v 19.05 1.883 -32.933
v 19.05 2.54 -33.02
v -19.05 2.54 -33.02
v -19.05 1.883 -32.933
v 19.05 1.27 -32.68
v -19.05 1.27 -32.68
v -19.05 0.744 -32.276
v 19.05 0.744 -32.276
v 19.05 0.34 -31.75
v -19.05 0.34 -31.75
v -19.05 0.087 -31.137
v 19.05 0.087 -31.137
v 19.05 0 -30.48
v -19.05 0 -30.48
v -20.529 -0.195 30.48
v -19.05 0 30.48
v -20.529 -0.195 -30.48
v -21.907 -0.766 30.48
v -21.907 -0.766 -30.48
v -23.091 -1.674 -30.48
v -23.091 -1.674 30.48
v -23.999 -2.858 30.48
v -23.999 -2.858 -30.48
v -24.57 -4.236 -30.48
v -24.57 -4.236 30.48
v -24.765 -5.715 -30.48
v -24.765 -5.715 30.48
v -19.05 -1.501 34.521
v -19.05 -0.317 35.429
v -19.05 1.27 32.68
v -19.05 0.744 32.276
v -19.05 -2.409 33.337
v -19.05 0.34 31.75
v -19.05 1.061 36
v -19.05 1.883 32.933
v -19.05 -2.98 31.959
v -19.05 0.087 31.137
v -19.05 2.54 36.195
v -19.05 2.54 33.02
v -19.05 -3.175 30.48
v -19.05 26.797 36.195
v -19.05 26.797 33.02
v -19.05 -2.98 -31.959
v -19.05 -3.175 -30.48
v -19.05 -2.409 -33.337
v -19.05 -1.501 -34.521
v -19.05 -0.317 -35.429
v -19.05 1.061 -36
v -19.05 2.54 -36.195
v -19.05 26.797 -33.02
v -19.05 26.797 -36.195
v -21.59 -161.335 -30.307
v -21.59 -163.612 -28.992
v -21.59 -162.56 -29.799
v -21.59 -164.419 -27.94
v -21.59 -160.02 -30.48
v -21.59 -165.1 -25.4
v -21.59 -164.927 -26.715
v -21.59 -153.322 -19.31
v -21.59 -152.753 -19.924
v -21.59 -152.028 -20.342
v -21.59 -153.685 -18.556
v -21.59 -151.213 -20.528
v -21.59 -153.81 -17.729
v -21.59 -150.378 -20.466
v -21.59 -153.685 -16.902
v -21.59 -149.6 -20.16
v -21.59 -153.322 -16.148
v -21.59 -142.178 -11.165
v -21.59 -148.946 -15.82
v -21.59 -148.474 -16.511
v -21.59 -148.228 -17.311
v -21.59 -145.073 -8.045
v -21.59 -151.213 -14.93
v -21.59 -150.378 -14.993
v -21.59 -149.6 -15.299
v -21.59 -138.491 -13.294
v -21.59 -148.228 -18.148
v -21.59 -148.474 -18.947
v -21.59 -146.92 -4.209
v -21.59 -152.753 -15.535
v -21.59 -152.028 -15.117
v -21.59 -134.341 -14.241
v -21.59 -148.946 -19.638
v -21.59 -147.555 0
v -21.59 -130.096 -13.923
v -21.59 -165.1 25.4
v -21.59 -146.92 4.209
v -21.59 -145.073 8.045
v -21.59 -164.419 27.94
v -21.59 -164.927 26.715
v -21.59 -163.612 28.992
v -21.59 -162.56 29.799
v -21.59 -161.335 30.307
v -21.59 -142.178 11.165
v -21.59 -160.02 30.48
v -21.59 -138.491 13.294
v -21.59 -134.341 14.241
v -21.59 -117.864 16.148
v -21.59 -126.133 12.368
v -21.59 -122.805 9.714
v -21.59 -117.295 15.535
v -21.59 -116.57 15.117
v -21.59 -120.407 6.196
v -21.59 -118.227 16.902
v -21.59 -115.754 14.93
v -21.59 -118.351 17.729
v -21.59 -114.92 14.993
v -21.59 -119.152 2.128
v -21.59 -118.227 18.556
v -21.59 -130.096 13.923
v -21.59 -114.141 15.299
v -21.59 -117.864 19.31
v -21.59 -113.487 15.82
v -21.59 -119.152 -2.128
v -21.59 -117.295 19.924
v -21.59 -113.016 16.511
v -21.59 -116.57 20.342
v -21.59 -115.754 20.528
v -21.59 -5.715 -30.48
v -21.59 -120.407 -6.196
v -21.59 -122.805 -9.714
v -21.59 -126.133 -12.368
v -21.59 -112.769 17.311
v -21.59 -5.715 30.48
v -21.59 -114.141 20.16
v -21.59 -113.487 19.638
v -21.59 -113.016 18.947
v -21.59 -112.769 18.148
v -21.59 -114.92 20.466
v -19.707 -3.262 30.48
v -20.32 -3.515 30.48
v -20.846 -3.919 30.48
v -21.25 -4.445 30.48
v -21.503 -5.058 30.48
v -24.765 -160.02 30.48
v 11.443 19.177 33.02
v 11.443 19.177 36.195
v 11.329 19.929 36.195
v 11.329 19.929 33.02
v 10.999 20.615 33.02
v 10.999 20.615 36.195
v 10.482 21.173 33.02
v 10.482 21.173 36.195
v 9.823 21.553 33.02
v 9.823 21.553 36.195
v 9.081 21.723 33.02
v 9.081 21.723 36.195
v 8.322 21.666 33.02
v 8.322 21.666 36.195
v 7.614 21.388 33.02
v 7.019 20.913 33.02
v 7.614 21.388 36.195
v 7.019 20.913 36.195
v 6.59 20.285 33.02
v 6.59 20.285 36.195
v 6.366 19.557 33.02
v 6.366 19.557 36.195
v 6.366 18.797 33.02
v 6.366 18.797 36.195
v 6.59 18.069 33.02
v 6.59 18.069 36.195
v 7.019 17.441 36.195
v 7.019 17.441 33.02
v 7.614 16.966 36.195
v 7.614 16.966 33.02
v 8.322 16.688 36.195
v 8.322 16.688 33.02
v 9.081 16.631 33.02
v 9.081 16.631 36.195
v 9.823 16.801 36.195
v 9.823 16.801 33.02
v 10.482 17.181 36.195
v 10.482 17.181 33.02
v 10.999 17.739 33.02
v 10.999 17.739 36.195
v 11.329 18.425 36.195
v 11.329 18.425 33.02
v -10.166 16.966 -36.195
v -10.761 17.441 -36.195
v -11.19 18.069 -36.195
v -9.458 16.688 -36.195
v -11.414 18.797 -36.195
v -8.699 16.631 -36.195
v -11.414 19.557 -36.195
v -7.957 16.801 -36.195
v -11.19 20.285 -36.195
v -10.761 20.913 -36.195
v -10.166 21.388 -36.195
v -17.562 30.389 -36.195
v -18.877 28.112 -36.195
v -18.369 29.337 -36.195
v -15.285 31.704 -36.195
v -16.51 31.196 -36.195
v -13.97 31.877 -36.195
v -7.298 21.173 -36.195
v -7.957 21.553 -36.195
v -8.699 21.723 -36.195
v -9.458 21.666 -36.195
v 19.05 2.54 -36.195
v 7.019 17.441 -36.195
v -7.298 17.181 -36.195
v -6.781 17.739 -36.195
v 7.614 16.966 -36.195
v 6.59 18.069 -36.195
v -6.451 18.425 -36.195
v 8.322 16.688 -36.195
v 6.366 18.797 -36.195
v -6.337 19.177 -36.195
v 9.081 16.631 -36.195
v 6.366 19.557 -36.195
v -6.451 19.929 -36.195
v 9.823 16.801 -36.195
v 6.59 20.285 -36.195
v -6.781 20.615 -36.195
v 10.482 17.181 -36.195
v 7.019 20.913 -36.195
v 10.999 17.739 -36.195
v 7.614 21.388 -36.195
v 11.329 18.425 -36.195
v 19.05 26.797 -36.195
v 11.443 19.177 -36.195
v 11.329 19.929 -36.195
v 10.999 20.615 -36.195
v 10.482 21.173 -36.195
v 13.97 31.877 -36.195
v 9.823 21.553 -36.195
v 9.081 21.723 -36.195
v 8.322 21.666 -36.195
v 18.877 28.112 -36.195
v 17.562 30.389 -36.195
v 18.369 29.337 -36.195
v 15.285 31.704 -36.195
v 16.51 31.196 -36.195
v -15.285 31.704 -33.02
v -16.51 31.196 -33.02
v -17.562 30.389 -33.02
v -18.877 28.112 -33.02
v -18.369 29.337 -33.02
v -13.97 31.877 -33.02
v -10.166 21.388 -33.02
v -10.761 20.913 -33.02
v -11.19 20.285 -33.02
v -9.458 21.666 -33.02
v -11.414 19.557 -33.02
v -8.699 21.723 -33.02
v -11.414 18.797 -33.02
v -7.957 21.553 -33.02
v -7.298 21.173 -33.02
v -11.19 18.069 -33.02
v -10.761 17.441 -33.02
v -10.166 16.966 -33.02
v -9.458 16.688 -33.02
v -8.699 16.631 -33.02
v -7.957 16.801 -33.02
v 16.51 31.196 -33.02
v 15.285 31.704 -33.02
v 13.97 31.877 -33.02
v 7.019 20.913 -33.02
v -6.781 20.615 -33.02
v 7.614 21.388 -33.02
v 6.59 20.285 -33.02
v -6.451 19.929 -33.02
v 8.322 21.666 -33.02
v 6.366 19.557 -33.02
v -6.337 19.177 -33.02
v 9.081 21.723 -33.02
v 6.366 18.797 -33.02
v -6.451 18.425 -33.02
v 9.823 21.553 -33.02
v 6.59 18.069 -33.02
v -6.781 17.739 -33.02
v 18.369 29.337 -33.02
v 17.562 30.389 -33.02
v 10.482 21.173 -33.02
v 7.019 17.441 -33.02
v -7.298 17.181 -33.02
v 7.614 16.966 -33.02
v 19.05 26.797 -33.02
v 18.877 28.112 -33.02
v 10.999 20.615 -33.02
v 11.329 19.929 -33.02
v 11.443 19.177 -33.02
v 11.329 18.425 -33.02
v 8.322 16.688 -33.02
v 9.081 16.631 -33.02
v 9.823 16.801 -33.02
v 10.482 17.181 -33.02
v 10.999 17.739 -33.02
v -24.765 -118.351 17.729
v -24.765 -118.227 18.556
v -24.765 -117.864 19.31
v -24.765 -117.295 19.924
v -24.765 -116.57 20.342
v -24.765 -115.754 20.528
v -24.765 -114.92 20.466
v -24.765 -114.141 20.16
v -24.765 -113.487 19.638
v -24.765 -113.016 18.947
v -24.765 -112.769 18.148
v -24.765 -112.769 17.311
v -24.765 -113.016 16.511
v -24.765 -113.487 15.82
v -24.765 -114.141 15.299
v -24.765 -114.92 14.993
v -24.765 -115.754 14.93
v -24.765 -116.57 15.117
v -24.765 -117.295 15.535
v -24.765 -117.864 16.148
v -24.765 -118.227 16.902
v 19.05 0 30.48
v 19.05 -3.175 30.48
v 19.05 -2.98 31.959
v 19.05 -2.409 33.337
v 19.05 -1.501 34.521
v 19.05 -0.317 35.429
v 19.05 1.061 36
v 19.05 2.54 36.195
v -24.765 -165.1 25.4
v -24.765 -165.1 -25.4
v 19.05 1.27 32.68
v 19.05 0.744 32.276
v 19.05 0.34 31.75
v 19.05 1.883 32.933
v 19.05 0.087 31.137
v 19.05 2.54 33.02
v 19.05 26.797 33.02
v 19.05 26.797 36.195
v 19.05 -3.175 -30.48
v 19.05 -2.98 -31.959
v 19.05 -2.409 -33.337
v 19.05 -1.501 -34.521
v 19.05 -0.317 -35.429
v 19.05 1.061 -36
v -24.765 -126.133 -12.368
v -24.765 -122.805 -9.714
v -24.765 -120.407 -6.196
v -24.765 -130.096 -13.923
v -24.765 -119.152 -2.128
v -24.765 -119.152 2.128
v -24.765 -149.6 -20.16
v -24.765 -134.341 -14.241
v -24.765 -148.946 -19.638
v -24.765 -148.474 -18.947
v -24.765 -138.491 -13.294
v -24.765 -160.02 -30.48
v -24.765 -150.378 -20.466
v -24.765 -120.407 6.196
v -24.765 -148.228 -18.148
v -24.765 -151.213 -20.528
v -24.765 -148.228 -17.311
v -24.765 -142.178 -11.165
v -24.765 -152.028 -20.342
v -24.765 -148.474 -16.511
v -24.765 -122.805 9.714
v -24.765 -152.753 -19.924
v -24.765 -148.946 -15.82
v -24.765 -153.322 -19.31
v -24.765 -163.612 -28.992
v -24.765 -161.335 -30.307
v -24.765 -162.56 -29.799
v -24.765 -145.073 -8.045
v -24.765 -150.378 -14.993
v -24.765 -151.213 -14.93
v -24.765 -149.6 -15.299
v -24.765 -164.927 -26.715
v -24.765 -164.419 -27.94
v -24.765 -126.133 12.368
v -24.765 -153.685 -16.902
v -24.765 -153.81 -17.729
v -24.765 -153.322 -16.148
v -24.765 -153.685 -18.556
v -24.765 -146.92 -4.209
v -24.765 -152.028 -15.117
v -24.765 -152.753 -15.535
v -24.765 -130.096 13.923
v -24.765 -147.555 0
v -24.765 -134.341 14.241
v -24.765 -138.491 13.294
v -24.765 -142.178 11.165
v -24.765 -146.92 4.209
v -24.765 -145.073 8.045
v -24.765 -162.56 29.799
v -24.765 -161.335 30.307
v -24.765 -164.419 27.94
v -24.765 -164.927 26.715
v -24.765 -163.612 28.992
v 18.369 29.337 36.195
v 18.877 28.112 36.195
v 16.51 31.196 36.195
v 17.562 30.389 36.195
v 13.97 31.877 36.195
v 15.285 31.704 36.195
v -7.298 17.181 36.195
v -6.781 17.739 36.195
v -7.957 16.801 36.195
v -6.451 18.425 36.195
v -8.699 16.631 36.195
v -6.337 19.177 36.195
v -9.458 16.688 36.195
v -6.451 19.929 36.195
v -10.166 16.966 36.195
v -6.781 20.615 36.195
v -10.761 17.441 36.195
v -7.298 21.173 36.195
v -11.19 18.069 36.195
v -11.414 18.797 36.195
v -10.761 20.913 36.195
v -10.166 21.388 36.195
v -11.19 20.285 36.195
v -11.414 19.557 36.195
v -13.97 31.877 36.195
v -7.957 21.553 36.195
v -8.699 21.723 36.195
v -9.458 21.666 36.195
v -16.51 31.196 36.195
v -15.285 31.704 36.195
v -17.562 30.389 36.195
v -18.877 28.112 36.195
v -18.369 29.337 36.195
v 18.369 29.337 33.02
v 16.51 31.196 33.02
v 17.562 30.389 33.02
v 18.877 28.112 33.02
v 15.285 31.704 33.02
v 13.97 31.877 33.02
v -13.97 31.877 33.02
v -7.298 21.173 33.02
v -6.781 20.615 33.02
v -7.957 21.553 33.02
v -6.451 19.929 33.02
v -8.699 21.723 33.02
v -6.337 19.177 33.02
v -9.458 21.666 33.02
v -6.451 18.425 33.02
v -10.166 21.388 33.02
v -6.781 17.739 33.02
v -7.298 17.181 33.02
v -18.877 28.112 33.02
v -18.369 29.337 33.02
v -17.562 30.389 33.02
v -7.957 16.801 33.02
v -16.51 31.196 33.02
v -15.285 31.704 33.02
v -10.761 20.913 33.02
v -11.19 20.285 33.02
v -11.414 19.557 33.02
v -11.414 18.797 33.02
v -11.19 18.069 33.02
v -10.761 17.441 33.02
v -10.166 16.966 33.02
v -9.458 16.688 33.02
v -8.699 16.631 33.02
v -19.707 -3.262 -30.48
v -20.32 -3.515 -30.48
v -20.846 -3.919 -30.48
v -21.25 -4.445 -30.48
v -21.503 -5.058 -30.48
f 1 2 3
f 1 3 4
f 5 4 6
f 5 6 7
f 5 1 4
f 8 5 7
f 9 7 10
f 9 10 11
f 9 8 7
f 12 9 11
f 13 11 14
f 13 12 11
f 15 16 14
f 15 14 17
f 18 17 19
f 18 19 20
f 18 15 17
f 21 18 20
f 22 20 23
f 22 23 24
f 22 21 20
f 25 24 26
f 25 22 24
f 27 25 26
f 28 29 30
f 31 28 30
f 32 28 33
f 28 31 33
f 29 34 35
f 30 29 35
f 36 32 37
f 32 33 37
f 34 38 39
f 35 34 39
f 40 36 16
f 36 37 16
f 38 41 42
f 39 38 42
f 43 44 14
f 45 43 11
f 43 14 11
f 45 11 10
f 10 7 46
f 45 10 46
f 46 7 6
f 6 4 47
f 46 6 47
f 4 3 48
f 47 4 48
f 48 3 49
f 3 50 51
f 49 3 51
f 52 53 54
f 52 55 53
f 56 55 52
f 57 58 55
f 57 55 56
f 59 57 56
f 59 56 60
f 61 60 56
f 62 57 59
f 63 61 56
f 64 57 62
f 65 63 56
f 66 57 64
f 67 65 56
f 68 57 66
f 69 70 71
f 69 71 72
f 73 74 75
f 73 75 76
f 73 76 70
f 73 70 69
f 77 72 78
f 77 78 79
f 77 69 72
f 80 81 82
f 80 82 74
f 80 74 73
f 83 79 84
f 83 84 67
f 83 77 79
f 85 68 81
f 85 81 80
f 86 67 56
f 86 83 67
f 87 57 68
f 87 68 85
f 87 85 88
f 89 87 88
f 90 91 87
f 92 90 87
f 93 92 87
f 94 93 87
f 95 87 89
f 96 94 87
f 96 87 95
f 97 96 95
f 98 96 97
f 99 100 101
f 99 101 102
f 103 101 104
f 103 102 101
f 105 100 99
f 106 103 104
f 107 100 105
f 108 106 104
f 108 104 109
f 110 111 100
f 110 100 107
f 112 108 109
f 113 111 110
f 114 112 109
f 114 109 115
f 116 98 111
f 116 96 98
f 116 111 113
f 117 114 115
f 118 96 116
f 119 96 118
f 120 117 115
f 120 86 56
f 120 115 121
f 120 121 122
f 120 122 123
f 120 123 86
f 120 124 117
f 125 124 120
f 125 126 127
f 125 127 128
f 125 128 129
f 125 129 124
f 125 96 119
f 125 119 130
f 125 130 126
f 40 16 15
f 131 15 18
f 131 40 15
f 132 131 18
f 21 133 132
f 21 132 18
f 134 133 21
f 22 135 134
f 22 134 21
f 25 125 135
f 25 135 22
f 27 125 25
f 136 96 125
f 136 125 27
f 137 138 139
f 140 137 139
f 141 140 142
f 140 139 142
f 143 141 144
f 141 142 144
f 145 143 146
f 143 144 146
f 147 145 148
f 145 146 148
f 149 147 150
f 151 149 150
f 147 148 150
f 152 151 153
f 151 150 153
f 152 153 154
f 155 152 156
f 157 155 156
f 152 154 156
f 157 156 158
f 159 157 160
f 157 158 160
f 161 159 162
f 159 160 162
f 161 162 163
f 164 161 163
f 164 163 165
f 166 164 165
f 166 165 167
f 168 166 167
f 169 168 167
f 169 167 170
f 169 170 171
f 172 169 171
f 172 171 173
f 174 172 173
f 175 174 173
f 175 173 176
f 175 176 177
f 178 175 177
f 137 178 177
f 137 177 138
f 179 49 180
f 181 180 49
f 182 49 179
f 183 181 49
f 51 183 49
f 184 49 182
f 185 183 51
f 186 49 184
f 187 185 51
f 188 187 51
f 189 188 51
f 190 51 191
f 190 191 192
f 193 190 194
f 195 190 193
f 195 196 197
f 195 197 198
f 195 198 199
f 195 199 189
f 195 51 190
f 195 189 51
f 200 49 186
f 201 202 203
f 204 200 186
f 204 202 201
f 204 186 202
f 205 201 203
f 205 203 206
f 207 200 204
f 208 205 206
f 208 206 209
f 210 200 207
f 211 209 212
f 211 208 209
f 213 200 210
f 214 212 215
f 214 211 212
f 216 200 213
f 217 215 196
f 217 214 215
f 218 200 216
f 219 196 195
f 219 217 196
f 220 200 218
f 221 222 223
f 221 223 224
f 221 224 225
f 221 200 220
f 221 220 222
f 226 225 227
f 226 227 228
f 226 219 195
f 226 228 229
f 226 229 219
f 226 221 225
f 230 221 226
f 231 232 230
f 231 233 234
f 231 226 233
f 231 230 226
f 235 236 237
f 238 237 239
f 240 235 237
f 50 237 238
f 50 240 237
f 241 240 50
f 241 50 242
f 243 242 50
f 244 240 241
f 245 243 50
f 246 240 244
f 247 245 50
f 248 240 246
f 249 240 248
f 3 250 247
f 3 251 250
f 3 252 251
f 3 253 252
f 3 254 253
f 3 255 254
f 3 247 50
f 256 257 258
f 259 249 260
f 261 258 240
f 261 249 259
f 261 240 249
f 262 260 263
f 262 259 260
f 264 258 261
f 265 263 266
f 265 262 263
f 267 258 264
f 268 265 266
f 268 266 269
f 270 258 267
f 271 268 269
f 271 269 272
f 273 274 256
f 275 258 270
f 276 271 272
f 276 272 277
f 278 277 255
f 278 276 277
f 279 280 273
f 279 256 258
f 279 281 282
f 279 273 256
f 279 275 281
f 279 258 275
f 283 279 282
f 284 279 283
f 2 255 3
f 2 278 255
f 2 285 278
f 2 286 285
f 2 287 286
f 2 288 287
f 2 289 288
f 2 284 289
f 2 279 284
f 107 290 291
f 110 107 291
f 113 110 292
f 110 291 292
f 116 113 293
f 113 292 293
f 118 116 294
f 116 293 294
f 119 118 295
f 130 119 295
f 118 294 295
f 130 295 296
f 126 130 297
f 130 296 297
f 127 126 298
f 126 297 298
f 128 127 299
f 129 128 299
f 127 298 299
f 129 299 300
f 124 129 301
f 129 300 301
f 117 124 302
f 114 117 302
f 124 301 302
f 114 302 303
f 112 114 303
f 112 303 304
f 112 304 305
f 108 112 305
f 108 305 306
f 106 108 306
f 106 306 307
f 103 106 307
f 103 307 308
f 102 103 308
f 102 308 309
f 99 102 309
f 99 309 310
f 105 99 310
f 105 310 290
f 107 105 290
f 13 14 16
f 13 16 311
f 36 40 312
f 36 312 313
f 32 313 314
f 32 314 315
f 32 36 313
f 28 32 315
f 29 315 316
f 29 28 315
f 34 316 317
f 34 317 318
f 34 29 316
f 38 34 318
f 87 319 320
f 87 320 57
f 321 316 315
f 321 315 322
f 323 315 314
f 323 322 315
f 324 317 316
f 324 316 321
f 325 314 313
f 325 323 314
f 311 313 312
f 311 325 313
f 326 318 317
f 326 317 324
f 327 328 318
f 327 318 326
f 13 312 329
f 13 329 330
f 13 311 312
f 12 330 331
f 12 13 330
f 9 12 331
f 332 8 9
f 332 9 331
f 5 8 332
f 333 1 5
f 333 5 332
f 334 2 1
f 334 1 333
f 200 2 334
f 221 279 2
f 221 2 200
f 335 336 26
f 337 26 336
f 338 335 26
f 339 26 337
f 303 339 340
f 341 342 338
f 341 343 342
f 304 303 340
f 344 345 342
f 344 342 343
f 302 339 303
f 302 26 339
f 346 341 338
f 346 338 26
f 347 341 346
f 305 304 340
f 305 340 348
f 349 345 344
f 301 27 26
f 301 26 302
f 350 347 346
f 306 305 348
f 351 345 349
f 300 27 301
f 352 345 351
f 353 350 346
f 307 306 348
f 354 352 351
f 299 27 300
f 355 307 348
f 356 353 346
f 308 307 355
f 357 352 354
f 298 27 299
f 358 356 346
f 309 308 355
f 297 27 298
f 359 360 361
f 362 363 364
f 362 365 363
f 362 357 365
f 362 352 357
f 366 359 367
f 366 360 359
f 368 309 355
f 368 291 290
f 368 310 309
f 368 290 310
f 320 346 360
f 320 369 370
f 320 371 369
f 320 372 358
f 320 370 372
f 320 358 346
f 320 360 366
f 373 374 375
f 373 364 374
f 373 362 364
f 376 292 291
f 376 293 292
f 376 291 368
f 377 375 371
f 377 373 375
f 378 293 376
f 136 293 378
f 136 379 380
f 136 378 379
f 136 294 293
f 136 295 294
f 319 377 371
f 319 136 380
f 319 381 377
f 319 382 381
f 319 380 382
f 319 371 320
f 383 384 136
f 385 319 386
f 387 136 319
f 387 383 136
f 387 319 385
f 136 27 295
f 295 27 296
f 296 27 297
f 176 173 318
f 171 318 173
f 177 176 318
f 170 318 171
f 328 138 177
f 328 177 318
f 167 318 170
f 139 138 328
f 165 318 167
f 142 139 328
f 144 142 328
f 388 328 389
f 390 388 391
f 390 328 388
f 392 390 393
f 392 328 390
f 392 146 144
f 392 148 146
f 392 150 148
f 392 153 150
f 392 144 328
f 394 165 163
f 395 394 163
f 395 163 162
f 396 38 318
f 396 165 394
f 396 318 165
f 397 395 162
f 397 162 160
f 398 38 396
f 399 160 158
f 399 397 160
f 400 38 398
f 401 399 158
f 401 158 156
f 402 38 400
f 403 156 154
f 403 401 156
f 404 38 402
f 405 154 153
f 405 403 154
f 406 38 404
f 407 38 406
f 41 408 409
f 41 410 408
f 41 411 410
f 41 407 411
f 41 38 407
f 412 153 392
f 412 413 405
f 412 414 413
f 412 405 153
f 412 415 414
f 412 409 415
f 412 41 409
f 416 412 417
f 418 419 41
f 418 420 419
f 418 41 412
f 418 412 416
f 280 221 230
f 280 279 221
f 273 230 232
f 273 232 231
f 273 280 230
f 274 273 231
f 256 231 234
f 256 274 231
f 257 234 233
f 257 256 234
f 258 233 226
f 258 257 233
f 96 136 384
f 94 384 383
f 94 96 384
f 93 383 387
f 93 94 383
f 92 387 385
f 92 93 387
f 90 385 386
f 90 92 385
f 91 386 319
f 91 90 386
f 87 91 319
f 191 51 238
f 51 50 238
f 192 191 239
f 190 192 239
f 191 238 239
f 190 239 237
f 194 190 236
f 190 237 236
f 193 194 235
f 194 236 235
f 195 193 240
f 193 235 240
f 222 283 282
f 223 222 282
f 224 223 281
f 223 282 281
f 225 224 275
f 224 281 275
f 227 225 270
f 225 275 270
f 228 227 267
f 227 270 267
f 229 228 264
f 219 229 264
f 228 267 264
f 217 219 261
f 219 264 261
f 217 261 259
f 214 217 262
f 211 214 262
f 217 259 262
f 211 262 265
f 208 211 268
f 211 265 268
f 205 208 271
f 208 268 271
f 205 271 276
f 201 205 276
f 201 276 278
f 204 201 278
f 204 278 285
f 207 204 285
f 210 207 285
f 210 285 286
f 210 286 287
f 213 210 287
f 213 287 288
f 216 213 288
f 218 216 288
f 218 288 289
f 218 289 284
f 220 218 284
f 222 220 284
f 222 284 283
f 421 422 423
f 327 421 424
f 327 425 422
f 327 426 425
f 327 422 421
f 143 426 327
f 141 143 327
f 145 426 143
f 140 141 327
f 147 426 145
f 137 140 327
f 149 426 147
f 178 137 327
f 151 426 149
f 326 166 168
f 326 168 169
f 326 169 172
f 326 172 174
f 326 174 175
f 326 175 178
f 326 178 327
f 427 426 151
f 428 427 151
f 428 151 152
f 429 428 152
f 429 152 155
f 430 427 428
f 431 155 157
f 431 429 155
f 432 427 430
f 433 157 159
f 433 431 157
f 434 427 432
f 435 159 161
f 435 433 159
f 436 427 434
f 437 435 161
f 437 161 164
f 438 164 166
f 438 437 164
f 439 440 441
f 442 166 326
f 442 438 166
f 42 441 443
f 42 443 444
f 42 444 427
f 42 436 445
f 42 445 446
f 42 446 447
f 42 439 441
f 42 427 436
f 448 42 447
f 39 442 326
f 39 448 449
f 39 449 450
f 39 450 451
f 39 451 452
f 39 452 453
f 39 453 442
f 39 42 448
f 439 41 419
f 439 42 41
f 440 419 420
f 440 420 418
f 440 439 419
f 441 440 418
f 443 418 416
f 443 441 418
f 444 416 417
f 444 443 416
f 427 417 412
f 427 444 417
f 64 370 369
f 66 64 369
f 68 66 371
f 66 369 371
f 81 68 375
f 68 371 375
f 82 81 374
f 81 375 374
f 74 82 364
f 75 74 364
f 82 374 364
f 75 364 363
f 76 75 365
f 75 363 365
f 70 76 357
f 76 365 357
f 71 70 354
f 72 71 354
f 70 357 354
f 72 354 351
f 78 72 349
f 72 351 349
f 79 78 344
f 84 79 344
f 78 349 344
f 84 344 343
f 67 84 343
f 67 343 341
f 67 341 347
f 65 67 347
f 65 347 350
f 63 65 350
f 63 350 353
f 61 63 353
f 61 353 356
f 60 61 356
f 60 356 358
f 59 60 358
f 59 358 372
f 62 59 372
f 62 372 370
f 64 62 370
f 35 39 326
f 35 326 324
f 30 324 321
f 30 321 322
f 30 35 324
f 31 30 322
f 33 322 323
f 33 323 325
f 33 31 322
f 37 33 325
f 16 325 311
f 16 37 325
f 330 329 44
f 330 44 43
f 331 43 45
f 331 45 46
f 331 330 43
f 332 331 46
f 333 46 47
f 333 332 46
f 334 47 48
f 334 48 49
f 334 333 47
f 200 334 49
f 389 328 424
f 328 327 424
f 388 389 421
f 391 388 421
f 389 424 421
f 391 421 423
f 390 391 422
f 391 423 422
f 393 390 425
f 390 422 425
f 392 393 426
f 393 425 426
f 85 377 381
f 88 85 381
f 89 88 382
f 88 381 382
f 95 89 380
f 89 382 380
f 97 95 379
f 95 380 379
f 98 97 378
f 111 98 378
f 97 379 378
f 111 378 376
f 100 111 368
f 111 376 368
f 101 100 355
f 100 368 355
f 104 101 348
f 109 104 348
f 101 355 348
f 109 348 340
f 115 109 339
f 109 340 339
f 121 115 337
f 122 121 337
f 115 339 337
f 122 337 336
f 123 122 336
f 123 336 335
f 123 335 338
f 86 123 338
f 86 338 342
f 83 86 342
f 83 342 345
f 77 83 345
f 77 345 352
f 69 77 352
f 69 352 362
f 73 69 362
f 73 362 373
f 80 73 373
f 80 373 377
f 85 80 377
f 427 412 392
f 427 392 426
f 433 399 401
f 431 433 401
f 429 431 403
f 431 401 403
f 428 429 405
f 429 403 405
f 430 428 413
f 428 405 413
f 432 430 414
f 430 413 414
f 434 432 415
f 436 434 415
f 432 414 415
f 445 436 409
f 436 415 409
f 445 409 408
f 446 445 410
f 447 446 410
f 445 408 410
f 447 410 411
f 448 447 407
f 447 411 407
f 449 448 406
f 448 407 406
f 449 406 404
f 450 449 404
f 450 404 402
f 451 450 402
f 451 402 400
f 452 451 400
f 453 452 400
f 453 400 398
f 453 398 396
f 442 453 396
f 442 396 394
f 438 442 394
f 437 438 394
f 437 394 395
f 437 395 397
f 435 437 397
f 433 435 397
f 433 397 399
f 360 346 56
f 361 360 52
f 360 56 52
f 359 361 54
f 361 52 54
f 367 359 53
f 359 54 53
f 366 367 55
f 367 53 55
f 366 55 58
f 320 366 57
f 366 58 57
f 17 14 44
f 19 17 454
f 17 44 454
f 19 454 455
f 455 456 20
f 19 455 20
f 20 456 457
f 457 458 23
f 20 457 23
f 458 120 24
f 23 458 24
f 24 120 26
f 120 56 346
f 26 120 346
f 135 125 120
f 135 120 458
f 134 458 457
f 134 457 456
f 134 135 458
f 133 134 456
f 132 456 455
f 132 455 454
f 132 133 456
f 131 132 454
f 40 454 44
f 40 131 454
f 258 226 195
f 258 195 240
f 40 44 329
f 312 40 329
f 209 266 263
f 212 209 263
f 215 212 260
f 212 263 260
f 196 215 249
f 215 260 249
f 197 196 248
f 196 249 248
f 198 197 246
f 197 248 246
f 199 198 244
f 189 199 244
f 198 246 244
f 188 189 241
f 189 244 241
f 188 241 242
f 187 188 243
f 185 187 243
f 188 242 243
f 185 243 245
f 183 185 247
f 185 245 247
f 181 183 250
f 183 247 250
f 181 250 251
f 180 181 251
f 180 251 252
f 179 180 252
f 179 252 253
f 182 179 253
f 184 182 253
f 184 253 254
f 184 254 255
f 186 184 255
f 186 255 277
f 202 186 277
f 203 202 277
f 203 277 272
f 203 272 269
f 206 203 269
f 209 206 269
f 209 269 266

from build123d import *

# Parameters (mm, degrees)
SKETCH1_W               = 38.1
SKETCH1_H               = 60.96
BASE_FLANGE1_DEPTH      = 3.175
EDGE_FLANGE1_DEPTH      = 38.1
EDGE_FLANGE1_BEND_DEPTH = 38.1
EDGE_FLANGE2_DEPTH      = 60.96
SKETCH17_R              = 14.28115
SKETCH17_R_2            = 2.8067
CUT_EXTRUDE1_DEPTH      = 175.607680959
SKETCH18_R              = 2.5527
CUT_EXTRUDE2_DEPTH      = 182.96600596
FILLET1_R               = 5.08


# Sheet-metal steps are written as plain solids
with BuildPart() as part:
    # Sketch1 → Base-Flange1 (new body)
    with BuildSketch(Plane(origin=(0, 0, 0), x_dir=(1, 0, 0), z_dir=(0, 1, 0))):
        Rectangle(SKETCH1_W, SKETCH1_H)
    extrude(amount=-BASE_FLANGE1_DEPTH)

    # Edge-Flange1 section (across the edge) → Edge-Flange1 (add)
    with BuildSketch(Plane(origin=(-19.05, 0, 33.02), x_dir=(0, 0, -1), z_dir=(1, 0, 0))):
        with BuildLine():
            Line((-3.175, 2.54), (-3.175, 31.877))
            Line((-3.175, 31.877), (0, 31.877))
            Line((0, 31.877), (0, 2.54))
            ThreePointArc((0, 2.54), (0.743948776, 0.743948776), (2.54, 0))
            Line((2.54, 0), (2.54, -3.175))
            ThreePointArc((2.54, -3.175), (-1.501115254, -1.501115254), (-3.175, 2.54))
        make_face()
    extrude(amount=EDGE_FLANGE1_DEPTH)

    # Edge-Flange1 section 2 (across the edge) → Edge-Flange1 bend (add)
    with BuildSketch(Plane(origin=(19.05, 0, -33.02), x_dir=(0, 0, 1), z_dir=(-1, 0, 0))):
        with BuildLine():
            Line((-3.175, 2.54), (-3.175, 31.877))
            Line((-3.175, 31.877), (0, 31.877))
            Line((0, 31.877), (0, 2.54))
            ThreePointArc((0, 2.54), (0.743948776, 0.743948776), (2.54, 0))
            Line((2.54, 0), (2.54, -3.175))
            ThreePointArc((2.54, -3.175), (-1.501115254, -1.501115254), (-3.175, 2.54))
        make_face()
    extrude(amount=EDGE_FLANGE1_BEND_DEPTH)

    # Edge-Flange2 section (across the edge) → Edge-Flange2 (add)
    with BuildSketch(Plane(origin=(-21.59, -3.175, 30.48), x_dir=(1, 0, 0), z_dir=(0, 0, -1))):
        with BuildLine():
            Line((-3.175, 2.54), (-3.175, 161.925))
            Line((-3.175, 161.925), (0, 161.925))
            Line((0, 161.925), (0, 2.54))
            ThreePointArc((0, 2.54), (0.743948776, 0.743948776), (2.54, 0))
            Line((2.54, 0), (2.54, -3.175))
            ThreePointArc((2.54, -3.175), (-1.501115254, -1.501115254), (-3.175, 2.54))
        make_face()
    extrude(amount=EDGE_FLANGE2_DEPTH)

    # Sketch17 → Cut-Extrude1 (cut, through all)
    with BuildSketch(Plane.ZY.offset(24.765)):
        with Locations(Location((0, -133.2738, 0), (0, 0, 270))):
            Circle(SKETCH17_R)
        with Locations(Location((-17.7292, -151.003, 0), (0, 0, 270))):
            Circle(SKETCH17_R_2)
        with Locations(Location((17.7292, -115.5446, 0), (0, 0, 270))):
            Circle(SKETCH17_R_2)
    extrude(amount=-CUT_EXTRUDE1_DEPTH, mode=Mode.SUBTRACT)

    # Sketch18 → Cut-Extrude2 (cut, through all)
    with BuildSketch(Plane.XY.offset(36.195)):
        with Locations((8.89, 19.177)):
            Circle(SKETCH18_R)
        with Locations((-8.89, 19.177)):
            Circle(SKETCH18_R)
    extrude(amount=-CUT_EXTRUDE2_DEPTH, mode=Mode.SUBTRACT)

    # Fillet1
    fillet1_edges = [part.edges().sort_by_distance(p)[0] for p in [
        (-19.05, 31.877, 34.6075),
        (19.05, 31.877, 34.6075),
        (19.05, 31.877, -34.6075),
        (-19.05, 31.877, -34.6075),
        (-23.1775, -165.1, 30.48),
        (-23.1775, -165.1, -30.48),
    ]]
    fillet(fillet1_edges, radius=FILLET1_R)


solid = part.part
